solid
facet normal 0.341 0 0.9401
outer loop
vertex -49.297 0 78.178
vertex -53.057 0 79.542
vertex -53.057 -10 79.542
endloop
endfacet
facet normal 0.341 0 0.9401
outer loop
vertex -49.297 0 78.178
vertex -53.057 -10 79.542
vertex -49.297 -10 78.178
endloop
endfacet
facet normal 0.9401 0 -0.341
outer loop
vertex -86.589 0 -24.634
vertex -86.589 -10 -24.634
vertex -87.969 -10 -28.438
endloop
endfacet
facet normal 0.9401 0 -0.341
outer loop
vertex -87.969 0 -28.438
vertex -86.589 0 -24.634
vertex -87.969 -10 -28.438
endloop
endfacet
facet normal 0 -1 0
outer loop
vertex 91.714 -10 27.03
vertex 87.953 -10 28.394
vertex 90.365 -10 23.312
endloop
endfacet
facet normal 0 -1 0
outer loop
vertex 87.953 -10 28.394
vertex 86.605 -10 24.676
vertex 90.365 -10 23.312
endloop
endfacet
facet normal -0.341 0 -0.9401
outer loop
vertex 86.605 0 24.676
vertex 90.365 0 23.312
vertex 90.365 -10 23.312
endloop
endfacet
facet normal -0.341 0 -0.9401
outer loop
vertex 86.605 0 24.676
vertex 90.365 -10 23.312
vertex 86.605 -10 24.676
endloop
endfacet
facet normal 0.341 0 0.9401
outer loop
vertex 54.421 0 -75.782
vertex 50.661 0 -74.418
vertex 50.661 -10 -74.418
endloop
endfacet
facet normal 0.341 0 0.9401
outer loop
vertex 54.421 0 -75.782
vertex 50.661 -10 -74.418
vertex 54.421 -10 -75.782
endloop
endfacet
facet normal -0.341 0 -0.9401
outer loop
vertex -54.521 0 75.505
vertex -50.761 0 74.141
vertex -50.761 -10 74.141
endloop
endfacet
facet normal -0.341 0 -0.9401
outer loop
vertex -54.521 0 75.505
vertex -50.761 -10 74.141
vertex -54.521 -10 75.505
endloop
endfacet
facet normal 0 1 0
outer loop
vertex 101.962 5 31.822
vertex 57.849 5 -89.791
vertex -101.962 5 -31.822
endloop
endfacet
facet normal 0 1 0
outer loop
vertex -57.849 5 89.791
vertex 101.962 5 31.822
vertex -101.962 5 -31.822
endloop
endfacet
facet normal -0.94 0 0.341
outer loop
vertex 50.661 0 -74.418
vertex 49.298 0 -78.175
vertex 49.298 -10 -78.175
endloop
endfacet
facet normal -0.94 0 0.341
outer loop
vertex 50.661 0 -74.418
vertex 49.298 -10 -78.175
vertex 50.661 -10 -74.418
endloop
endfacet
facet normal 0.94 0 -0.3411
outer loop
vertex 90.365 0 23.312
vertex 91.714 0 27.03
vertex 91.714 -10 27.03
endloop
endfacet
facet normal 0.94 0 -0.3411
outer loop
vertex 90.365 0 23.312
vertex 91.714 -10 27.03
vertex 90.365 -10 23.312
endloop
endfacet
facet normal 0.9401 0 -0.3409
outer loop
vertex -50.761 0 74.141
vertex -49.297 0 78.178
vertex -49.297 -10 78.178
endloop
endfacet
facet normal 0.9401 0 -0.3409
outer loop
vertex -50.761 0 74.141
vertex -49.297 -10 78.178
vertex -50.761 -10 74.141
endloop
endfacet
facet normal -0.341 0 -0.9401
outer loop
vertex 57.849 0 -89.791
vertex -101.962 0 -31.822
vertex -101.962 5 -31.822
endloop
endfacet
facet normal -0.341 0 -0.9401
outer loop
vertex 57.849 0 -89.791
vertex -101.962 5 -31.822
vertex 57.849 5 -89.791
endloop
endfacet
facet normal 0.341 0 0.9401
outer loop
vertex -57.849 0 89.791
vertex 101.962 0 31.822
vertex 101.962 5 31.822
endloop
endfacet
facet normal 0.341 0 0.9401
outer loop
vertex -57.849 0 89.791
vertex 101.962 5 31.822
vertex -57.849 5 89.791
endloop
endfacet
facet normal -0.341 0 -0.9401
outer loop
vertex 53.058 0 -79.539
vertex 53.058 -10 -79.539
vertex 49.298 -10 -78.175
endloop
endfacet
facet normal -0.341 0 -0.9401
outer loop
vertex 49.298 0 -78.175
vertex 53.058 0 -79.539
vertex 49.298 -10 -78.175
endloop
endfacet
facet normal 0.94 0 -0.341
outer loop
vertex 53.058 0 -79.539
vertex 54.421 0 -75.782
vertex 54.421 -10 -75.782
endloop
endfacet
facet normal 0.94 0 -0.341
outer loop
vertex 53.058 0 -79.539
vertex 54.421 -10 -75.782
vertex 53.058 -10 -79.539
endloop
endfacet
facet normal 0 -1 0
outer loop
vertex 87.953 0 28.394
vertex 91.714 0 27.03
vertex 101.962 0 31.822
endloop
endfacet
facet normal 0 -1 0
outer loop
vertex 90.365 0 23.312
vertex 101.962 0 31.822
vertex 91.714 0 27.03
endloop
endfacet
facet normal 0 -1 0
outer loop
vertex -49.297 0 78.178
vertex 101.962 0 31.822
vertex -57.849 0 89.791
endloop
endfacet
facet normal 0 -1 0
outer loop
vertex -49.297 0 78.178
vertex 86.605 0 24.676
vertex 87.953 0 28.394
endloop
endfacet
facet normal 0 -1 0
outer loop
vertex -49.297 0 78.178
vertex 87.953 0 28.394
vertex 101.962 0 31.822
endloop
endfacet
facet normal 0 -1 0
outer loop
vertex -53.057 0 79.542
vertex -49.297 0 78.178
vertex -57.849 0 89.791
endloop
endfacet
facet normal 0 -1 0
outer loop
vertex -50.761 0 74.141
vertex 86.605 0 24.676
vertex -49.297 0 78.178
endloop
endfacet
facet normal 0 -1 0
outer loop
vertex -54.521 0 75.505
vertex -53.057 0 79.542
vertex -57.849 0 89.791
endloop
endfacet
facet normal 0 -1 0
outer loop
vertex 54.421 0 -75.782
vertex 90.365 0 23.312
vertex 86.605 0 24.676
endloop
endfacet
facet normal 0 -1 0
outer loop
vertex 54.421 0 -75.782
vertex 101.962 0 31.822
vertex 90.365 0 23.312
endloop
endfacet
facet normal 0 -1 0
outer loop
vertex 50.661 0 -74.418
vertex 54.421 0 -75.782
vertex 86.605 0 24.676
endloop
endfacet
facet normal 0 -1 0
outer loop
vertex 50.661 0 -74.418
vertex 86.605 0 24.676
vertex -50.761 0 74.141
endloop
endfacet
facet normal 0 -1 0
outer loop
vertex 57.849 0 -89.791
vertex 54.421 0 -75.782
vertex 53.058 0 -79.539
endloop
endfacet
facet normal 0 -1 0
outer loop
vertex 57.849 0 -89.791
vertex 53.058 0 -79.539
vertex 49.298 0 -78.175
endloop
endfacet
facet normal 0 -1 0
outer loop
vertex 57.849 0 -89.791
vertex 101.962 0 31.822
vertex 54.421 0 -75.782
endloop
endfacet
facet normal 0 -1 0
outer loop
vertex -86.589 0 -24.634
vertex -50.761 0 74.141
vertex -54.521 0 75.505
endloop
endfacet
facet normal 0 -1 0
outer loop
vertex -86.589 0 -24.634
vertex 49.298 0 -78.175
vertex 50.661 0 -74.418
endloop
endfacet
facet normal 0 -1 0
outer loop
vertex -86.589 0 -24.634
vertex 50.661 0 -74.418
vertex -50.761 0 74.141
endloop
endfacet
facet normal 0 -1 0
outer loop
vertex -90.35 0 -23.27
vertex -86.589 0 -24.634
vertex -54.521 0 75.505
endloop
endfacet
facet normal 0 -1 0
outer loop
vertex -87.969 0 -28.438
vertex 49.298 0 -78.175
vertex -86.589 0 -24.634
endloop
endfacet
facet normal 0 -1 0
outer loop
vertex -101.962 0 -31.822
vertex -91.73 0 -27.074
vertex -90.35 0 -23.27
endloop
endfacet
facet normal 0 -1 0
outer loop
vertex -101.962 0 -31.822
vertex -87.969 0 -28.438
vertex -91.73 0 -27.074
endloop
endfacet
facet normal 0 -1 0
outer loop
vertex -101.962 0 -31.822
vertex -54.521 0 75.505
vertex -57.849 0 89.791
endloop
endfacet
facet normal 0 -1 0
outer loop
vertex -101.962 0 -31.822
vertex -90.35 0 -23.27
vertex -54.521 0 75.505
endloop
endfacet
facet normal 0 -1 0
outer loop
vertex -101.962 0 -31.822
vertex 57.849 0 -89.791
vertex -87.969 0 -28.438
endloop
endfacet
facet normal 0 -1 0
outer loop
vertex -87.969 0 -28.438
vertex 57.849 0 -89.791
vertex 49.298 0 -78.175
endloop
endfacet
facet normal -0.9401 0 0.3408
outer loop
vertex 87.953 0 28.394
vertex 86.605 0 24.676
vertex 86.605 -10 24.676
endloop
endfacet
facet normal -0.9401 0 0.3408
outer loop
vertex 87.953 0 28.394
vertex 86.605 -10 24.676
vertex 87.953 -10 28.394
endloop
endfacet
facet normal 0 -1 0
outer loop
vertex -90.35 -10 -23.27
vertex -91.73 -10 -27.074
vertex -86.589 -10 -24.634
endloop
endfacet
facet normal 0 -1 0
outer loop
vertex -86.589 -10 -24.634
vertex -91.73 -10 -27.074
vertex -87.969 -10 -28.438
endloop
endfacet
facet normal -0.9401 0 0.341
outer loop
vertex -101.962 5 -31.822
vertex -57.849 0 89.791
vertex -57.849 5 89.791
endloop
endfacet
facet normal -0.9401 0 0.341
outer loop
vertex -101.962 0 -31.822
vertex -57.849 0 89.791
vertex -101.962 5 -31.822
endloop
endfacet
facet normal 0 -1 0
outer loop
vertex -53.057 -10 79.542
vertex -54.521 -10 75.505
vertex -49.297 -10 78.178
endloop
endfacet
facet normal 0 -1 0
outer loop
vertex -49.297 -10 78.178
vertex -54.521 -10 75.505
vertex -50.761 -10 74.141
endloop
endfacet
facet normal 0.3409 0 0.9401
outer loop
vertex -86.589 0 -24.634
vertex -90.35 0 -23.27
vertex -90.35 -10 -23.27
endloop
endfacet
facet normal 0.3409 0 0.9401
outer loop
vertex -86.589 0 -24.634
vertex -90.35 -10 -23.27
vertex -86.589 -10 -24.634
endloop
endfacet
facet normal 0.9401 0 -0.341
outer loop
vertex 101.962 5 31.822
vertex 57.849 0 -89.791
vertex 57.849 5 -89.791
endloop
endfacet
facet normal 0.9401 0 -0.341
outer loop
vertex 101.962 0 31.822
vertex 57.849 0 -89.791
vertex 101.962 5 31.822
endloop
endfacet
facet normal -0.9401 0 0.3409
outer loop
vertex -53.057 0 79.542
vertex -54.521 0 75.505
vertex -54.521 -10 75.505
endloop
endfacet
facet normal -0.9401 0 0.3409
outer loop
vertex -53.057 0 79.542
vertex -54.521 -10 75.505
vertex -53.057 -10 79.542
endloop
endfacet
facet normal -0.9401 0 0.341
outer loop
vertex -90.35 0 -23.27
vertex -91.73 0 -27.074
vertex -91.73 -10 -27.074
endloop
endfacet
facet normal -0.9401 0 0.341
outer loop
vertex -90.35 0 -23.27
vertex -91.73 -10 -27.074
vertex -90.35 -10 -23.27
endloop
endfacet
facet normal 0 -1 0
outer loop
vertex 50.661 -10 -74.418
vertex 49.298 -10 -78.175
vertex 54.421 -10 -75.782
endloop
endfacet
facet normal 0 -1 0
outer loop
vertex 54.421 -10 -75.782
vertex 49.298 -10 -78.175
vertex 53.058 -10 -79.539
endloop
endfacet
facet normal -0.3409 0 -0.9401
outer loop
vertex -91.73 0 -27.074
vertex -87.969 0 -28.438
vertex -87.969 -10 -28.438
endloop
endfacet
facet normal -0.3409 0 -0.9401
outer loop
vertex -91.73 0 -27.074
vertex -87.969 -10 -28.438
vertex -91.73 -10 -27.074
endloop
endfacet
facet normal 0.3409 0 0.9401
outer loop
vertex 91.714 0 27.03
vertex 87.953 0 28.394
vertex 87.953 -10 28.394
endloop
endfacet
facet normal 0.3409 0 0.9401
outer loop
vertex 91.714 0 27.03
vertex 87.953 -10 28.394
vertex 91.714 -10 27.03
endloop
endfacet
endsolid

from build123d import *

# Parameters (mm, degrees)
EXTRUDE_1_DEPTH = 5
EXTRUDE_2_DEPTH = 10


with BuildPart() as part:
    # 草图2 → 凸台-拉伸1 (new body)
    with BuildSketch(Plane(origin=(0, 0, 0), x_dir=(1, 0, 0), z_dir=(0, 1, 0))):
        Polygon((-101.961949946, 31.82244298), (57.849497127, 89.790549593), (101.961949946, -31.82244298), (-57.849497127, -89.790549593), align=None)
    extrude(amount=EXTRUDE_1_DEPTH)

    # 草图3 → 凸台-拉伸2 (add)
    with BuildSketch(Plane(origin=(0, 0, 0), x_dir=(1, 0, 0), z_dir=(0, 1, 0))):
        Polygon((-53.056842775, -79.542085251), (-49.296573432, -78.178129801), (-50.760983059, -74.140919768), (-54.521252402, -75.504875218), align=None)
        Polygon((87.953231018, -28.393770643), (91.713500361, -27.029815193), (90.364794207, -23.311586416), (86.604524864, -24.675541865), align=None)
        Polygon((50.660555447, 74.417875215), (54.42082479, 75.781830665), (53.058052487, 79.538838208), (49.297783144, 78.174882759), align=None)
        Polygon((-90.349544911, 23.26954585), (-86.589275569, 24.6335013), (-87.969378224, 28.438286645), (-91.729647567, 27.074331195), align=None)
    extrude(amount=-EXTRUDE_2_DEPTH)


solid = part.part
